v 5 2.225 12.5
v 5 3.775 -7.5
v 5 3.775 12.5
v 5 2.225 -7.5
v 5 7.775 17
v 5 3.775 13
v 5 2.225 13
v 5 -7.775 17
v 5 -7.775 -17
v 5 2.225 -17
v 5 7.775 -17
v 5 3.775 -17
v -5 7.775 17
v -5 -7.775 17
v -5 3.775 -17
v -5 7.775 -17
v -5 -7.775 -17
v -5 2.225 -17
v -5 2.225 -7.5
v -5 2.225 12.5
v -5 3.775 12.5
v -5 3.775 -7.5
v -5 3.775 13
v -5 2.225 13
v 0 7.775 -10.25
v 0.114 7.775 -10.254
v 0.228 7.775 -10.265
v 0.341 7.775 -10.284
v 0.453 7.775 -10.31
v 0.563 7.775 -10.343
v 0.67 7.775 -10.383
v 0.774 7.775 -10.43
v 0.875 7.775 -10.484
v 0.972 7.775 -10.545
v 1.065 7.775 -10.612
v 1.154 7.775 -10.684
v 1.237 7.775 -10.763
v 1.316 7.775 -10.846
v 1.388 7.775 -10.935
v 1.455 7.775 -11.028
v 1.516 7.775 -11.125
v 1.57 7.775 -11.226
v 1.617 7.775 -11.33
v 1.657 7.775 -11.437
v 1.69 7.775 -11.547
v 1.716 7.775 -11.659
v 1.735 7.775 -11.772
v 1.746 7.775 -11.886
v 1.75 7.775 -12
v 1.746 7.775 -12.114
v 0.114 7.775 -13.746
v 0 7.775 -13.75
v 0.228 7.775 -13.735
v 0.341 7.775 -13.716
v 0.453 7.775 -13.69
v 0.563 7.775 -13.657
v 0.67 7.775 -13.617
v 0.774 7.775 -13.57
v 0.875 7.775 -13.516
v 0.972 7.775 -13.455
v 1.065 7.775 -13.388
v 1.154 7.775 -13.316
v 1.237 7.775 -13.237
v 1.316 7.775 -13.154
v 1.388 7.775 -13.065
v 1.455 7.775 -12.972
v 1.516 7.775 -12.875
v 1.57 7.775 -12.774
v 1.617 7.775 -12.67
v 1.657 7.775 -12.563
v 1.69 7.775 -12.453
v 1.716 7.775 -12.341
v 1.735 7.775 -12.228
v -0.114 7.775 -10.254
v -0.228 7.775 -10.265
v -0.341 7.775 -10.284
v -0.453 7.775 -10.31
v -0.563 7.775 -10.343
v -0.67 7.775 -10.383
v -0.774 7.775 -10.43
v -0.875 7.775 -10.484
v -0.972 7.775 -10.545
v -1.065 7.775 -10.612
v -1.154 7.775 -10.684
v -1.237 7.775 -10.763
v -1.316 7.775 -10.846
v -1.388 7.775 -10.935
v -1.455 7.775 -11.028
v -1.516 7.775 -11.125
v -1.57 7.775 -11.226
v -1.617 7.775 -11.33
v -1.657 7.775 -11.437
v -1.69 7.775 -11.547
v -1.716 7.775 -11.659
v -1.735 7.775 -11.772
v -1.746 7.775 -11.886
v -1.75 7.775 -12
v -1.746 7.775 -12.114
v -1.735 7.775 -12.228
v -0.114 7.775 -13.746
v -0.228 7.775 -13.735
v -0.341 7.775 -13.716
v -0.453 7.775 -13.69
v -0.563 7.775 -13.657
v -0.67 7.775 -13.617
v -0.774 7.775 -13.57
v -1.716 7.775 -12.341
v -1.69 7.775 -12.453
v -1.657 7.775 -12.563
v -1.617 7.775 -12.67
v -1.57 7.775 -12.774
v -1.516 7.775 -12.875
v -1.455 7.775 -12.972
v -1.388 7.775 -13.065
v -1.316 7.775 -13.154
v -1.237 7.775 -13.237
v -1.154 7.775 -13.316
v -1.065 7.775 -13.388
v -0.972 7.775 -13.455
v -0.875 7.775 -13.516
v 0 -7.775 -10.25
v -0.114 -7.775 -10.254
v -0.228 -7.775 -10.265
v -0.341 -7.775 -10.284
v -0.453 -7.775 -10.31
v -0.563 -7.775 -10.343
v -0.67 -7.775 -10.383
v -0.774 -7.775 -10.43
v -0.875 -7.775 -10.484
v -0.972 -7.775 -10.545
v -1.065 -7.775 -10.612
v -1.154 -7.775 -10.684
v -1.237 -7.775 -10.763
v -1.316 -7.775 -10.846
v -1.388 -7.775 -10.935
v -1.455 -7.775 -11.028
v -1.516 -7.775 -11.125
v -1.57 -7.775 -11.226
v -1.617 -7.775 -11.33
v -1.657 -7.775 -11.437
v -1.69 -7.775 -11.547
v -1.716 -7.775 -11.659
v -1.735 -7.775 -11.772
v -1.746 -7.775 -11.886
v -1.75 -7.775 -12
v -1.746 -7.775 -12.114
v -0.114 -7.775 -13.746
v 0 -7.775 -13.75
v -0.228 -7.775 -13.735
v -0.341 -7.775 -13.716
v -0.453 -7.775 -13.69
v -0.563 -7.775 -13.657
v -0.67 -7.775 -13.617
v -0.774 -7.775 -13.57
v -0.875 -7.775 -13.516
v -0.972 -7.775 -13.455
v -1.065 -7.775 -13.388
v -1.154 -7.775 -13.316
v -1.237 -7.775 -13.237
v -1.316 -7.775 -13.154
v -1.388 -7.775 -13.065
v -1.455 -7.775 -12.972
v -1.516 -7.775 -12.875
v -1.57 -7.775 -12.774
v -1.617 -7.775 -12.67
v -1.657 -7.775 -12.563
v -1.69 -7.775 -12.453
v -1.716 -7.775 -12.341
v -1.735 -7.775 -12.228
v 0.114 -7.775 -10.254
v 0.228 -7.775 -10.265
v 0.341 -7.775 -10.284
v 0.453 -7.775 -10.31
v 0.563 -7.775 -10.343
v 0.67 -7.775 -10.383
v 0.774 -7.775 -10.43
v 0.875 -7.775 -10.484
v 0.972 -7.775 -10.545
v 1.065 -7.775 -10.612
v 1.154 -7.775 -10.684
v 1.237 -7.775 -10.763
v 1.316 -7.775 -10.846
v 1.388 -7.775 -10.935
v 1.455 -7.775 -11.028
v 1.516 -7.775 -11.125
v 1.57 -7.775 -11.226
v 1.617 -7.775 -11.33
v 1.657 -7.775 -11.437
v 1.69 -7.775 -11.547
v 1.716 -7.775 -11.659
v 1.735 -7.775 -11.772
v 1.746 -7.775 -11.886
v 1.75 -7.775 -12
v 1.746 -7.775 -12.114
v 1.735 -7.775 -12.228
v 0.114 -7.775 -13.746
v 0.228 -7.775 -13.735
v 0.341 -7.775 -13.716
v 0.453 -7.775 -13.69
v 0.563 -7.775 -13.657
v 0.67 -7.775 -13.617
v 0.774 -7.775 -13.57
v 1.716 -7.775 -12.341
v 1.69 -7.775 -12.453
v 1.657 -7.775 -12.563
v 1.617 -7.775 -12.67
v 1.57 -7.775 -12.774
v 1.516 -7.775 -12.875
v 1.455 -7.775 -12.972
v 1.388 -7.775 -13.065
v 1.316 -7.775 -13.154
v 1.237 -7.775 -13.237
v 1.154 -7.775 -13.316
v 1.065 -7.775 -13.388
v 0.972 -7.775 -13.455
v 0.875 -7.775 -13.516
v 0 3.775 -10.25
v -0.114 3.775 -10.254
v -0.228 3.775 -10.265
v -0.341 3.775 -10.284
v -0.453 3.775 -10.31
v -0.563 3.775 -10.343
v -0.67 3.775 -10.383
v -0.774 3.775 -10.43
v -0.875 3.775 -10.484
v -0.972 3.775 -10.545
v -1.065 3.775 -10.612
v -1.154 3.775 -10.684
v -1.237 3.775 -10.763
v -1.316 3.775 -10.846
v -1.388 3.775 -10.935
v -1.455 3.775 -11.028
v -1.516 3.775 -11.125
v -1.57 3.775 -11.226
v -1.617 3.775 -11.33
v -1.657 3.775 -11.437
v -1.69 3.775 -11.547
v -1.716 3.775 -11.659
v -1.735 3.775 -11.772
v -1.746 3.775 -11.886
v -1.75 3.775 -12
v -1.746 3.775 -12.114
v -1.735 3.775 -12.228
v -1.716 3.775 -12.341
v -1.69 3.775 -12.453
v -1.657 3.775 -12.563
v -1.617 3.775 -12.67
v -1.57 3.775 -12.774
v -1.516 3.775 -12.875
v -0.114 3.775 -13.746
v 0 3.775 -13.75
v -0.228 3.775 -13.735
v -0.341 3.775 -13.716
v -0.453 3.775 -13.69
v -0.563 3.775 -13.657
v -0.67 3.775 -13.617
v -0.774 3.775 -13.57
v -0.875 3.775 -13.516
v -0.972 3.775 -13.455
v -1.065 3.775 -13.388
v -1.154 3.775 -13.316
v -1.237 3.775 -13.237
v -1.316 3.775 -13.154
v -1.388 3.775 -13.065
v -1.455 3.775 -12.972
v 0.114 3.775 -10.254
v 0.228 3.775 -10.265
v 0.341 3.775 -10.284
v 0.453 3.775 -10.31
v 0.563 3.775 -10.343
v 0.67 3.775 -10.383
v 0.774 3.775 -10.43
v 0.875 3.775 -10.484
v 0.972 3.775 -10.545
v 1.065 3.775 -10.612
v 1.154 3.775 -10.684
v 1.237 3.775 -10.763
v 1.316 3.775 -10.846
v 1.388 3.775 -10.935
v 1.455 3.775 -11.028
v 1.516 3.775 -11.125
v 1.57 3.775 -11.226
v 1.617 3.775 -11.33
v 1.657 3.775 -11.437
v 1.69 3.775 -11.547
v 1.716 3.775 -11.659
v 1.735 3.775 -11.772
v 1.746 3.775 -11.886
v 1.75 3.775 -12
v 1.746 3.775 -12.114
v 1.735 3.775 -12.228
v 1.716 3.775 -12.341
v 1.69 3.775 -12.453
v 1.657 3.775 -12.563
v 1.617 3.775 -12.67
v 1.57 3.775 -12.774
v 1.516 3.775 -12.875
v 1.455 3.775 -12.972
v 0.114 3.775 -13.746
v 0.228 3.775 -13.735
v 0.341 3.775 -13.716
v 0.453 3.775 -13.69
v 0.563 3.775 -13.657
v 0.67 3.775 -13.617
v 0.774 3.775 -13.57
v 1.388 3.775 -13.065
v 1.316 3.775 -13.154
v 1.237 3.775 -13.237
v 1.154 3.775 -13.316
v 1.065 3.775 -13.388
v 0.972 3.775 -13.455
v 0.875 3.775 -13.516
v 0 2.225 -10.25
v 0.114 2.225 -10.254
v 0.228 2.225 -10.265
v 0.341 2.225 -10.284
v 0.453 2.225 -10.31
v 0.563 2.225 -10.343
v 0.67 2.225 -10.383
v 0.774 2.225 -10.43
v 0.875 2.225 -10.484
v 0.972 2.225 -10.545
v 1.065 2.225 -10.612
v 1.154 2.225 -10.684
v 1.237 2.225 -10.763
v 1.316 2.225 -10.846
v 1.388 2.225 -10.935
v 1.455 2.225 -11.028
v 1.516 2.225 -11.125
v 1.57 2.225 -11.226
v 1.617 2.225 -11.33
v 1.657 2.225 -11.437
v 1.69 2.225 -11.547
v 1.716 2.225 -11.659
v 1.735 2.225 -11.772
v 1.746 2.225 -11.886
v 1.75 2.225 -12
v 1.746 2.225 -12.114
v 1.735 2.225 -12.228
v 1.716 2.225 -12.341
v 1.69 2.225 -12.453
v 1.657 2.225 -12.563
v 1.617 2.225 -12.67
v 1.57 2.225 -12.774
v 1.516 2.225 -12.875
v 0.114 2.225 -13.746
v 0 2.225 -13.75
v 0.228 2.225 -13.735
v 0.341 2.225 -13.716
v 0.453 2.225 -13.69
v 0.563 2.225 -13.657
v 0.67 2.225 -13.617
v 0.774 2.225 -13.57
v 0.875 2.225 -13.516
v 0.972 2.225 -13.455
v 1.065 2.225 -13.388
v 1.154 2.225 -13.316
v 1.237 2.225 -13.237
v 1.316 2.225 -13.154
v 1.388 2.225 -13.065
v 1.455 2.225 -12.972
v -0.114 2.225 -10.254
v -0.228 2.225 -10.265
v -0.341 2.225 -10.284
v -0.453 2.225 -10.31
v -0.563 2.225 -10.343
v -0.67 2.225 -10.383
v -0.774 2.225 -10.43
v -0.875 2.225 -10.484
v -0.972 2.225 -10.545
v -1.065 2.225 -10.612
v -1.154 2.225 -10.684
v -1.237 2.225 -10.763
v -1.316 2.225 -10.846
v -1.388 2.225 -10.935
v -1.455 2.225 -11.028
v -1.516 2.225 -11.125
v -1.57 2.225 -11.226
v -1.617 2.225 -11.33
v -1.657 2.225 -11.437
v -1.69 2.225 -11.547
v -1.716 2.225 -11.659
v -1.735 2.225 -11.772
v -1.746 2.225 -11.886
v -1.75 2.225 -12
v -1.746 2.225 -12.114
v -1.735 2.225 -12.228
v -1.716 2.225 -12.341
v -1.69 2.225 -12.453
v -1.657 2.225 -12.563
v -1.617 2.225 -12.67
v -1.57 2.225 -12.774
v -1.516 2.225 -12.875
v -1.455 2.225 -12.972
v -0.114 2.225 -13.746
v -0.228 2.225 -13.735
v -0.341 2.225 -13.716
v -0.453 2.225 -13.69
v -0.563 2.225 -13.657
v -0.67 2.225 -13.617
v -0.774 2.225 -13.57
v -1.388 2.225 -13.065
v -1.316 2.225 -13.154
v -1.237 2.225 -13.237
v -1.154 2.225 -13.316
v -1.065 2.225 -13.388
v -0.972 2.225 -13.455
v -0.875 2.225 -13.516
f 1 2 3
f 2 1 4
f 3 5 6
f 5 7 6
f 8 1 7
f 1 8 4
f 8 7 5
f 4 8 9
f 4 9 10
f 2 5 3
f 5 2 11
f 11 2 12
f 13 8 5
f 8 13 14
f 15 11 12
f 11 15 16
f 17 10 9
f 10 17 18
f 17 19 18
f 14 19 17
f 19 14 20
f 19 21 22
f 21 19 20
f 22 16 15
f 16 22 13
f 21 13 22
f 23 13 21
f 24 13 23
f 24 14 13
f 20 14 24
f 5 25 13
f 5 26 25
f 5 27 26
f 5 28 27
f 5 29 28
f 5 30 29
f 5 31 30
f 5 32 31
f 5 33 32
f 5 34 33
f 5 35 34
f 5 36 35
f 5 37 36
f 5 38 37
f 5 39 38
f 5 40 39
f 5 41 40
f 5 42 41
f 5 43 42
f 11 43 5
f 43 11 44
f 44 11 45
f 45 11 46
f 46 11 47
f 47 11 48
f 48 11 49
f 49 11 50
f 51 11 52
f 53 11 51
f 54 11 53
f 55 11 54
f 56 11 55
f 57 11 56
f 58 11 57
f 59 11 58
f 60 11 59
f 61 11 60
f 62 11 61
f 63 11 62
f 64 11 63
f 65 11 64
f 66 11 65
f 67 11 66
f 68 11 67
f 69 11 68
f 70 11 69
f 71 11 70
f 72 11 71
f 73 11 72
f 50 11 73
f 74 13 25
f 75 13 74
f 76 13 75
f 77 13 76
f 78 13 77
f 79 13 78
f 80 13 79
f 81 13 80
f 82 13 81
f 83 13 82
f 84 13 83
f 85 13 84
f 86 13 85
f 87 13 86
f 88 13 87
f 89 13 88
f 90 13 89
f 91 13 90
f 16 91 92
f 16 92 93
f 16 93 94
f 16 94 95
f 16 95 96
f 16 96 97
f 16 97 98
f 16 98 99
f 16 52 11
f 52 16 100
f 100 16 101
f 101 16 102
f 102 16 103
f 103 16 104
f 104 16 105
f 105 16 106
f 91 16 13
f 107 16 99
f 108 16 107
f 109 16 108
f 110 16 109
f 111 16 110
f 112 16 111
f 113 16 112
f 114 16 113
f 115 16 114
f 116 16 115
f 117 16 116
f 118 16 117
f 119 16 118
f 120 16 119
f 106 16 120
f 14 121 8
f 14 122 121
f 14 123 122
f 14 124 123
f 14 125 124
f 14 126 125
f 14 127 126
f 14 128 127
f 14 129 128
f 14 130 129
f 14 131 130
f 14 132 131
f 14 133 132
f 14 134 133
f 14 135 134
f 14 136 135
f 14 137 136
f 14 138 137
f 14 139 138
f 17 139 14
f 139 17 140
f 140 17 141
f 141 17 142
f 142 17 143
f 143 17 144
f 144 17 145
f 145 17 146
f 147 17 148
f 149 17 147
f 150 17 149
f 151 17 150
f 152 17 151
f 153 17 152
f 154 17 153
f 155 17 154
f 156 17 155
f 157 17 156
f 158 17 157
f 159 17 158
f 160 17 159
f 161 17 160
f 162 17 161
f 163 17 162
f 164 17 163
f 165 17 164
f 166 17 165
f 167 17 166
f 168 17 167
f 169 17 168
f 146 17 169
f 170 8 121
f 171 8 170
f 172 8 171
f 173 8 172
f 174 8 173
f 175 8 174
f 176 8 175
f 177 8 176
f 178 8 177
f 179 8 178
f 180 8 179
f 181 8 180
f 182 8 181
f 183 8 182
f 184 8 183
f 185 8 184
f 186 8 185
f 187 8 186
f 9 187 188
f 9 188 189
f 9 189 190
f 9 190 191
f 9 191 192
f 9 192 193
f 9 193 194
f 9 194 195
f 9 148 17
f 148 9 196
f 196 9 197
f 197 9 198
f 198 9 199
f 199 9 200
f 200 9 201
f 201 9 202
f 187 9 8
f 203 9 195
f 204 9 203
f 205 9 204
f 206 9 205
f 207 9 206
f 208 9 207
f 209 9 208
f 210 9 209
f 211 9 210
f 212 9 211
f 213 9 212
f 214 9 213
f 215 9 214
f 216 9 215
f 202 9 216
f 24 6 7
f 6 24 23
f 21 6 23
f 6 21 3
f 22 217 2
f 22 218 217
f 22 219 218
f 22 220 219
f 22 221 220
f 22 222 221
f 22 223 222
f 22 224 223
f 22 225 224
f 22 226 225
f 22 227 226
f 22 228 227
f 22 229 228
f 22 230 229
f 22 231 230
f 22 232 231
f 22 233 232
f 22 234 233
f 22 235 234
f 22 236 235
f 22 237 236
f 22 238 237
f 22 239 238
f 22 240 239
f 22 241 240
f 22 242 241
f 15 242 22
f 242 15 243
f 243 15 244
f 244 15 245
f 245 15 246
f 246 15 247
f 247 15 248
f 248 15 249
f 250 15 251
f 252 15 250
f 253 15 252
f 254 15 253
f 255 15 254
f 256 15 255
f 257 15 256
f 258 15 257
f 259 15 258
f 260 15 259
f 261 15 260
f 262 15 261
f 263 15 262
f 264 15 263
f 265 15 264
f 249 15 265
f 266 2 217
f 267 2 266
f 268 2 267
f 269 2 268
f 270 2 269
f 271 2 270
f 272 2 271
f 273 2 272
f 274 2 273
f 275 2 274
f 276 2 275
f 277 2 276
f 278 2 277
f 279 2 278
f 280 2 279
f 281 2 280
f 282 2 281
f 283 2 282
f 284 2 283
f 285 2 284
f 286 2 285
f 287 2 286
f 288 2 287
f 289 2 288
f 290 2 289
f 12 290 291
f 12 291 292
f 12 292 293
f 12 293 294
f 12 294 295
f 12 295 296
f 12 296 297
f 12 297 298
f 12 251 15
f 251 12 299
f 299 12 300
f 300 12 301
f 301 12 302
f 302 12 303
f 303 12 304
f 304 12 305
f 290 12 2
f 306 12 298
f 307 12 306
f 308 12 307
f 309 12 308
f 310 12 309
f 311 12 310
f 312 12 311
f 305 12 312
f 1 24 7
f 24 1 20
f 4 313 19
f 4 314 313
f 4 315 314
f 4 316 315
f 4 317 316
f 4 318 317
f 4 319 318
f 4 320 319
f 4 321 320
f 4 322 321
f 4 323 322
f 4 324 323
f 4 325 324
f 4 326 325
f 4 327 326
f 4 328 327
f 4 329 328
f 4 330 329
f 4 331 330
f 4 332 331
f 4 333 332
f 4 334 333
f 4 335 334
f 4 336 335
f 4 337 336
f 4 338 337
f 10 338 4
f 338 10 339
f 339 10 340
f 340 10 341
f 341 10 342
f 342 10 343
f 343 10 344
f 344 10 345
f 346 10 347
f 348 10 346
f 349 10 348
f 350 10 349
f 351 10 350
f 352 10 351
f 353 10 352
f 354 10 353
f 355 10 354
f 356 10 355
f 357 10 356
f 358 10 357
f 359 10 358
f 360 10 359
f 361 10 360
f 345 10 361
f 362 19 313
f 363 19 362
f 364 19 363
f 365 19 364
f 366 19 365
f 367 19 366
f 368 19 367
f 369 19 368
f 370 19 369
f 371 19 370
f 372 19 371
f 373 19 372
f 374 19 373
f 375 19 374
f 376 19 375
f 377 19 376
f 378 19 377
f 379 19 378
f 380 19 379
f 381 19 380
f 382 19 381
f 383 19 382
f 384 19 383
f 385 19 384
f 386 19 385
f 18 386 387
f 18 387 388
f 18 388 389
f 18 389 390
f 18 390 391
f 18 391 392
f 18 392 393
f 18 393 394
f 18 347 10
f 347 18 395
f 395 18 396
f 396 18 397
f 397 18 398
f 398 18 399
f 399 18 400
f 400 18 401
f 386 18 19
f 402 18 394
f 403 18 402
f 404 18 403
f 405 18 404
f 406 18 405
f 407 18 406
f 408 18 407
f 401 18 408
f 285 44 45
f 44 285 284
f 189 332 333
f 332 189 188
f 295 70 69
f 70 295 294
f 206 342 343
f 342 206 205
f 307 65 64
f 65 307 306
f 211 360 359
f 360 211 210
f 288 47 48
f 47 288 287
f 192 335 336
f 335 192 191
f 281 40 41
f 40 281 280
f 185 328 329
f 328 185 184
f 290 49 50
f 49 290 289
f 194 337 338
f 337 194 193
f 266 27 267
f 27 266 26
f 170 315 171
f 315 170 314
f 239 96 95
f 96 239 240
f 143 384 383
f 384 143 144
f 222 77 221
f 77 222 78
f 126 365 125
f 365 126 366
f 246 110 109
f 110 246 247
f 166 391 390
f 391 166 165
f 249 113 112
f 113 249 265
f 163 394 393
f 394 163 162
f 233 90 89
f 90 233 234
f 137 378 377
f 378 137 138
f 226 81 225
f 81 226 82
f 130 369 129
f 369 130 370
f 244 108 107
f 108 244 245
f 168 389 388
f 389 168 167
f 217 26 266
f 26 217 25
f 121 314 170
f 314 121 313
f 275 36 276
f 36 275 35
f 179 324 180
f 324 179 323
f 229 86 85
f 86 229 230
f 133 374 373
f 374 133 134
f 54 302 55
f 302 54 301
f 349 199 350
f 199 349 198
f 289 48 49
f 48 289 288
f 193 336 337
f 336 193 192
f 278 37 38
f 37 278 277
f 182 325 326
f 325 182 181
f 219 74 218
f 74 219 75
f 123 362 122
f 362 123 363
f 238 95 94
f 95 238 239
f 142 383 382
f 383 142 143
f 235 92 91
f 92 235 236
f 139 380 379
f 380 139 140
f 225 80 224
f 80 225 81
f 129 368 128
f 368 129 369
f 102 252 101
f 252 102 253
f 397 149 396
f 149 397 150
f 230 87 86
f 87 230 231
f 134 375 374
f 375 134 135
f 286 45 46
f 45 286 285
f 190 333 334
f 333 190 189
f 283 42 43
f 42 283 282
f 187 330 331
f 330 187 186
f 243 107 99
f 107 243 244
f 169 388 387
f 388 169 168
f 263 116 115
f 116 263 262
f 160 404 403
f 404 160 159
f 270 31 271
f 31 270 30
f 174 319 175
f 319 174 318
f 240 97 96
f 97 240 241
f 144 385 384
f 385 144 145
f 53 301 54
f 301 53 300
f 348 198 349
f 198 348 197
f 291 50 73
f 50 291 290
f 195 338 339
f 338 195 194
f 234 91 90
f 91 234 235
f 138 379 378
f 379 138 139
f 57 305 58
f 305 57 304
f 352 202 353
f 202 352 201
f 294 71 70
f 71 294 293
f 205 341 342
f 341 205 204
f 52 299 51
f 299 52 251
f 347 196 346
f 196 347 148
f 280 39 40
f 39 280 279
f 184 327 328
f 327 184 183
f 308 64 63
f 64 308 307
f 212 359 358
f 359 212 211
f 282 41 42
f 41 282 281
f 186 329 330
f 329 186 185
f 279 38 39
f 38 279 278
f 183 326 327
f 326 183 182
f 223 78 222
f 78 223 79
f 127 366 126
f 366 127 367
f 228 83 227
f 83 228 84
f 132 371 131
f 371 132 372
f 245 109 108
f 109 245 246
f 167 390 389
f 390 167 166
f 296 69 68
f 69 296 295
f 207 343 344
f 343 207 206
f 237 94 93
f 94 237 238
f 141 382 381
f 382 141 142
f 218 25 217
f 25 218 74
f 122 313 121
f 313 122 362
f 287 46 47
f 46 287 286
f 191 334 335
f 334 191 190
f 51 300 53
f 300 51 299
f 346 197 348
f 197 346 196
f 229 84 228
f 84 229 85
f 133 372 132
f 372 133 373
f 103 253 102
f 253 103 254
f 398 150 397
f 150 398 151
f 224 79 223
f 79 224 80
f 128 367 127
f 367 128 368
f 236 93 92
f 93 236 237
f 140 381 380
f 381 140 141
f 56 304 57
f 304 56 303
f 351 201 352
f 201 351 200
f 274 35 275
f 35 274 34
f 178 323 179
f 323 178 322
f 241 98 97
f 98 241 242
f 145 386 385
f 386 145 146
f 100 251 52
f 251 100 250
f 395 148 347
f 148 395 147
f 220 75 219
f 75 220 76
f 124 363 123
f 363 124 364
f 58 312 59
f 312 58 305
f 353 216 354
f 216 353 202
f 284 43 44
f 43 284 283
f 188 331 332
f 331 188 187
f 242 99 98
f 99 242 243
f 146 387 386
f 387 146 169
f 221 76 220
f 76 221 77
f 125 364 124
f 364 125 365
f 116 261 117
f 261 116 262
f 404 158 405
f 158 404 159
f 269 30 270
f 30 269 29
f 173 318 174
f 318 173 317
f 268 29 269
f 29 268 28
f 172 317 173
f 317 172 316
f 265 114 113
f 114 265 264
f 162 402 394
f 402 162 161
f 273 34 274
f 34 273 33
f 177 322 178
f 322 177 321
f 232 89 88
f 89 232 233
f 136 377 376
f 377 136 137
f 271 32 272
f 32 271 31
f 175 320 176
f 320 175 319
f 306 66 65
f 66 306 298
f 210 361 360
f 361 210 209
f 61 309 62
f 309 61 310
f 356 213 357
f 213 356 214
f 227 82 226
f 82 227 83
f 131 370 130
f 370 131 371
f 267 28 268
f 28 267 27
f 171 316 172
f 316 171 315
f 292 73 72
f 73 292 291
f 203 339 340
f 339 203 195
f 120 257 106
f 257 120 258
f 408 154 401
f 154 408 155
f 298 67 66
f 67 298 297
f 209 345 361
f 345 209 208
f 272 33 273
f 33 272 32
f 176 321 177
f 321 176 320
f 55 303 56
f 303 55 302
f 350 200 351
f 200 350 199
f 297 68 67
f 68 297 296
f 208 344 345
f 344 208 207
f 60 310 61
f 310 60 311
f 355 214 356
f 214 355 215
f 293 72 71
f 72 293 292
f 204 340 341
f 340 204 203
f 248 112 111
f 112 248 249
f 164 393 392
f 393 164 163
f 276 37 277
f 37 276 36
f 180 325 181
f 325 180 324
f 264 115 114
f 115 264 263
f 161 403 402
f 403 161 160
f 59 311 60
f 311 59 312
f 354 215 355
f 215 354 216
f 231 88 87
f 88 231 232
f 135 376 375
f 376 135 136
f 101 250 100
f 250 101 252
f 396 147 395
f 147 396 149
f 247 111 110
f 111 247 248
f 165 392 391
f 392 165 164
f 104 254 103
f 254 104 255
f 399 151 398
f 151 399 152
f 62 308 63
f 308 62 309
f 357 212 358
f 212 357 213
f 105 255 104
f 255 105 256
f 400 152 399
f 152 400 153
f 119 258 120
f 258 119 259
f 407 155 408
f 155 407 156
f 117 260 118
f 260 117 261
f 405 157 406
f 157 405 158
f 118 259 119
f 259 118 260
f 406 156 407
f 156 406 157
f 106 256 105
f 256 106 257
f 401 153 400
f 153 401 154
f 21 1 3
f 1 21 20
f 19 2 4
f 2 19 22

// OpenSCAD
front=10;
back=4;
center=1.55;
difference()
{
	cube([10, front+center+back, 34], center=true);
	translate([0, (front-back)/2, -4])
		cube([12, center, 34], center=true);
	translate([0, 0, -12])
		rotate([90, 0, 0])
			cylinder(d=3.5, h=1+front+back+center, center=true, $fn=96);
}

#translate([0, (front-back)/2, 2.5]) cube([10, center, 20], center=true);
